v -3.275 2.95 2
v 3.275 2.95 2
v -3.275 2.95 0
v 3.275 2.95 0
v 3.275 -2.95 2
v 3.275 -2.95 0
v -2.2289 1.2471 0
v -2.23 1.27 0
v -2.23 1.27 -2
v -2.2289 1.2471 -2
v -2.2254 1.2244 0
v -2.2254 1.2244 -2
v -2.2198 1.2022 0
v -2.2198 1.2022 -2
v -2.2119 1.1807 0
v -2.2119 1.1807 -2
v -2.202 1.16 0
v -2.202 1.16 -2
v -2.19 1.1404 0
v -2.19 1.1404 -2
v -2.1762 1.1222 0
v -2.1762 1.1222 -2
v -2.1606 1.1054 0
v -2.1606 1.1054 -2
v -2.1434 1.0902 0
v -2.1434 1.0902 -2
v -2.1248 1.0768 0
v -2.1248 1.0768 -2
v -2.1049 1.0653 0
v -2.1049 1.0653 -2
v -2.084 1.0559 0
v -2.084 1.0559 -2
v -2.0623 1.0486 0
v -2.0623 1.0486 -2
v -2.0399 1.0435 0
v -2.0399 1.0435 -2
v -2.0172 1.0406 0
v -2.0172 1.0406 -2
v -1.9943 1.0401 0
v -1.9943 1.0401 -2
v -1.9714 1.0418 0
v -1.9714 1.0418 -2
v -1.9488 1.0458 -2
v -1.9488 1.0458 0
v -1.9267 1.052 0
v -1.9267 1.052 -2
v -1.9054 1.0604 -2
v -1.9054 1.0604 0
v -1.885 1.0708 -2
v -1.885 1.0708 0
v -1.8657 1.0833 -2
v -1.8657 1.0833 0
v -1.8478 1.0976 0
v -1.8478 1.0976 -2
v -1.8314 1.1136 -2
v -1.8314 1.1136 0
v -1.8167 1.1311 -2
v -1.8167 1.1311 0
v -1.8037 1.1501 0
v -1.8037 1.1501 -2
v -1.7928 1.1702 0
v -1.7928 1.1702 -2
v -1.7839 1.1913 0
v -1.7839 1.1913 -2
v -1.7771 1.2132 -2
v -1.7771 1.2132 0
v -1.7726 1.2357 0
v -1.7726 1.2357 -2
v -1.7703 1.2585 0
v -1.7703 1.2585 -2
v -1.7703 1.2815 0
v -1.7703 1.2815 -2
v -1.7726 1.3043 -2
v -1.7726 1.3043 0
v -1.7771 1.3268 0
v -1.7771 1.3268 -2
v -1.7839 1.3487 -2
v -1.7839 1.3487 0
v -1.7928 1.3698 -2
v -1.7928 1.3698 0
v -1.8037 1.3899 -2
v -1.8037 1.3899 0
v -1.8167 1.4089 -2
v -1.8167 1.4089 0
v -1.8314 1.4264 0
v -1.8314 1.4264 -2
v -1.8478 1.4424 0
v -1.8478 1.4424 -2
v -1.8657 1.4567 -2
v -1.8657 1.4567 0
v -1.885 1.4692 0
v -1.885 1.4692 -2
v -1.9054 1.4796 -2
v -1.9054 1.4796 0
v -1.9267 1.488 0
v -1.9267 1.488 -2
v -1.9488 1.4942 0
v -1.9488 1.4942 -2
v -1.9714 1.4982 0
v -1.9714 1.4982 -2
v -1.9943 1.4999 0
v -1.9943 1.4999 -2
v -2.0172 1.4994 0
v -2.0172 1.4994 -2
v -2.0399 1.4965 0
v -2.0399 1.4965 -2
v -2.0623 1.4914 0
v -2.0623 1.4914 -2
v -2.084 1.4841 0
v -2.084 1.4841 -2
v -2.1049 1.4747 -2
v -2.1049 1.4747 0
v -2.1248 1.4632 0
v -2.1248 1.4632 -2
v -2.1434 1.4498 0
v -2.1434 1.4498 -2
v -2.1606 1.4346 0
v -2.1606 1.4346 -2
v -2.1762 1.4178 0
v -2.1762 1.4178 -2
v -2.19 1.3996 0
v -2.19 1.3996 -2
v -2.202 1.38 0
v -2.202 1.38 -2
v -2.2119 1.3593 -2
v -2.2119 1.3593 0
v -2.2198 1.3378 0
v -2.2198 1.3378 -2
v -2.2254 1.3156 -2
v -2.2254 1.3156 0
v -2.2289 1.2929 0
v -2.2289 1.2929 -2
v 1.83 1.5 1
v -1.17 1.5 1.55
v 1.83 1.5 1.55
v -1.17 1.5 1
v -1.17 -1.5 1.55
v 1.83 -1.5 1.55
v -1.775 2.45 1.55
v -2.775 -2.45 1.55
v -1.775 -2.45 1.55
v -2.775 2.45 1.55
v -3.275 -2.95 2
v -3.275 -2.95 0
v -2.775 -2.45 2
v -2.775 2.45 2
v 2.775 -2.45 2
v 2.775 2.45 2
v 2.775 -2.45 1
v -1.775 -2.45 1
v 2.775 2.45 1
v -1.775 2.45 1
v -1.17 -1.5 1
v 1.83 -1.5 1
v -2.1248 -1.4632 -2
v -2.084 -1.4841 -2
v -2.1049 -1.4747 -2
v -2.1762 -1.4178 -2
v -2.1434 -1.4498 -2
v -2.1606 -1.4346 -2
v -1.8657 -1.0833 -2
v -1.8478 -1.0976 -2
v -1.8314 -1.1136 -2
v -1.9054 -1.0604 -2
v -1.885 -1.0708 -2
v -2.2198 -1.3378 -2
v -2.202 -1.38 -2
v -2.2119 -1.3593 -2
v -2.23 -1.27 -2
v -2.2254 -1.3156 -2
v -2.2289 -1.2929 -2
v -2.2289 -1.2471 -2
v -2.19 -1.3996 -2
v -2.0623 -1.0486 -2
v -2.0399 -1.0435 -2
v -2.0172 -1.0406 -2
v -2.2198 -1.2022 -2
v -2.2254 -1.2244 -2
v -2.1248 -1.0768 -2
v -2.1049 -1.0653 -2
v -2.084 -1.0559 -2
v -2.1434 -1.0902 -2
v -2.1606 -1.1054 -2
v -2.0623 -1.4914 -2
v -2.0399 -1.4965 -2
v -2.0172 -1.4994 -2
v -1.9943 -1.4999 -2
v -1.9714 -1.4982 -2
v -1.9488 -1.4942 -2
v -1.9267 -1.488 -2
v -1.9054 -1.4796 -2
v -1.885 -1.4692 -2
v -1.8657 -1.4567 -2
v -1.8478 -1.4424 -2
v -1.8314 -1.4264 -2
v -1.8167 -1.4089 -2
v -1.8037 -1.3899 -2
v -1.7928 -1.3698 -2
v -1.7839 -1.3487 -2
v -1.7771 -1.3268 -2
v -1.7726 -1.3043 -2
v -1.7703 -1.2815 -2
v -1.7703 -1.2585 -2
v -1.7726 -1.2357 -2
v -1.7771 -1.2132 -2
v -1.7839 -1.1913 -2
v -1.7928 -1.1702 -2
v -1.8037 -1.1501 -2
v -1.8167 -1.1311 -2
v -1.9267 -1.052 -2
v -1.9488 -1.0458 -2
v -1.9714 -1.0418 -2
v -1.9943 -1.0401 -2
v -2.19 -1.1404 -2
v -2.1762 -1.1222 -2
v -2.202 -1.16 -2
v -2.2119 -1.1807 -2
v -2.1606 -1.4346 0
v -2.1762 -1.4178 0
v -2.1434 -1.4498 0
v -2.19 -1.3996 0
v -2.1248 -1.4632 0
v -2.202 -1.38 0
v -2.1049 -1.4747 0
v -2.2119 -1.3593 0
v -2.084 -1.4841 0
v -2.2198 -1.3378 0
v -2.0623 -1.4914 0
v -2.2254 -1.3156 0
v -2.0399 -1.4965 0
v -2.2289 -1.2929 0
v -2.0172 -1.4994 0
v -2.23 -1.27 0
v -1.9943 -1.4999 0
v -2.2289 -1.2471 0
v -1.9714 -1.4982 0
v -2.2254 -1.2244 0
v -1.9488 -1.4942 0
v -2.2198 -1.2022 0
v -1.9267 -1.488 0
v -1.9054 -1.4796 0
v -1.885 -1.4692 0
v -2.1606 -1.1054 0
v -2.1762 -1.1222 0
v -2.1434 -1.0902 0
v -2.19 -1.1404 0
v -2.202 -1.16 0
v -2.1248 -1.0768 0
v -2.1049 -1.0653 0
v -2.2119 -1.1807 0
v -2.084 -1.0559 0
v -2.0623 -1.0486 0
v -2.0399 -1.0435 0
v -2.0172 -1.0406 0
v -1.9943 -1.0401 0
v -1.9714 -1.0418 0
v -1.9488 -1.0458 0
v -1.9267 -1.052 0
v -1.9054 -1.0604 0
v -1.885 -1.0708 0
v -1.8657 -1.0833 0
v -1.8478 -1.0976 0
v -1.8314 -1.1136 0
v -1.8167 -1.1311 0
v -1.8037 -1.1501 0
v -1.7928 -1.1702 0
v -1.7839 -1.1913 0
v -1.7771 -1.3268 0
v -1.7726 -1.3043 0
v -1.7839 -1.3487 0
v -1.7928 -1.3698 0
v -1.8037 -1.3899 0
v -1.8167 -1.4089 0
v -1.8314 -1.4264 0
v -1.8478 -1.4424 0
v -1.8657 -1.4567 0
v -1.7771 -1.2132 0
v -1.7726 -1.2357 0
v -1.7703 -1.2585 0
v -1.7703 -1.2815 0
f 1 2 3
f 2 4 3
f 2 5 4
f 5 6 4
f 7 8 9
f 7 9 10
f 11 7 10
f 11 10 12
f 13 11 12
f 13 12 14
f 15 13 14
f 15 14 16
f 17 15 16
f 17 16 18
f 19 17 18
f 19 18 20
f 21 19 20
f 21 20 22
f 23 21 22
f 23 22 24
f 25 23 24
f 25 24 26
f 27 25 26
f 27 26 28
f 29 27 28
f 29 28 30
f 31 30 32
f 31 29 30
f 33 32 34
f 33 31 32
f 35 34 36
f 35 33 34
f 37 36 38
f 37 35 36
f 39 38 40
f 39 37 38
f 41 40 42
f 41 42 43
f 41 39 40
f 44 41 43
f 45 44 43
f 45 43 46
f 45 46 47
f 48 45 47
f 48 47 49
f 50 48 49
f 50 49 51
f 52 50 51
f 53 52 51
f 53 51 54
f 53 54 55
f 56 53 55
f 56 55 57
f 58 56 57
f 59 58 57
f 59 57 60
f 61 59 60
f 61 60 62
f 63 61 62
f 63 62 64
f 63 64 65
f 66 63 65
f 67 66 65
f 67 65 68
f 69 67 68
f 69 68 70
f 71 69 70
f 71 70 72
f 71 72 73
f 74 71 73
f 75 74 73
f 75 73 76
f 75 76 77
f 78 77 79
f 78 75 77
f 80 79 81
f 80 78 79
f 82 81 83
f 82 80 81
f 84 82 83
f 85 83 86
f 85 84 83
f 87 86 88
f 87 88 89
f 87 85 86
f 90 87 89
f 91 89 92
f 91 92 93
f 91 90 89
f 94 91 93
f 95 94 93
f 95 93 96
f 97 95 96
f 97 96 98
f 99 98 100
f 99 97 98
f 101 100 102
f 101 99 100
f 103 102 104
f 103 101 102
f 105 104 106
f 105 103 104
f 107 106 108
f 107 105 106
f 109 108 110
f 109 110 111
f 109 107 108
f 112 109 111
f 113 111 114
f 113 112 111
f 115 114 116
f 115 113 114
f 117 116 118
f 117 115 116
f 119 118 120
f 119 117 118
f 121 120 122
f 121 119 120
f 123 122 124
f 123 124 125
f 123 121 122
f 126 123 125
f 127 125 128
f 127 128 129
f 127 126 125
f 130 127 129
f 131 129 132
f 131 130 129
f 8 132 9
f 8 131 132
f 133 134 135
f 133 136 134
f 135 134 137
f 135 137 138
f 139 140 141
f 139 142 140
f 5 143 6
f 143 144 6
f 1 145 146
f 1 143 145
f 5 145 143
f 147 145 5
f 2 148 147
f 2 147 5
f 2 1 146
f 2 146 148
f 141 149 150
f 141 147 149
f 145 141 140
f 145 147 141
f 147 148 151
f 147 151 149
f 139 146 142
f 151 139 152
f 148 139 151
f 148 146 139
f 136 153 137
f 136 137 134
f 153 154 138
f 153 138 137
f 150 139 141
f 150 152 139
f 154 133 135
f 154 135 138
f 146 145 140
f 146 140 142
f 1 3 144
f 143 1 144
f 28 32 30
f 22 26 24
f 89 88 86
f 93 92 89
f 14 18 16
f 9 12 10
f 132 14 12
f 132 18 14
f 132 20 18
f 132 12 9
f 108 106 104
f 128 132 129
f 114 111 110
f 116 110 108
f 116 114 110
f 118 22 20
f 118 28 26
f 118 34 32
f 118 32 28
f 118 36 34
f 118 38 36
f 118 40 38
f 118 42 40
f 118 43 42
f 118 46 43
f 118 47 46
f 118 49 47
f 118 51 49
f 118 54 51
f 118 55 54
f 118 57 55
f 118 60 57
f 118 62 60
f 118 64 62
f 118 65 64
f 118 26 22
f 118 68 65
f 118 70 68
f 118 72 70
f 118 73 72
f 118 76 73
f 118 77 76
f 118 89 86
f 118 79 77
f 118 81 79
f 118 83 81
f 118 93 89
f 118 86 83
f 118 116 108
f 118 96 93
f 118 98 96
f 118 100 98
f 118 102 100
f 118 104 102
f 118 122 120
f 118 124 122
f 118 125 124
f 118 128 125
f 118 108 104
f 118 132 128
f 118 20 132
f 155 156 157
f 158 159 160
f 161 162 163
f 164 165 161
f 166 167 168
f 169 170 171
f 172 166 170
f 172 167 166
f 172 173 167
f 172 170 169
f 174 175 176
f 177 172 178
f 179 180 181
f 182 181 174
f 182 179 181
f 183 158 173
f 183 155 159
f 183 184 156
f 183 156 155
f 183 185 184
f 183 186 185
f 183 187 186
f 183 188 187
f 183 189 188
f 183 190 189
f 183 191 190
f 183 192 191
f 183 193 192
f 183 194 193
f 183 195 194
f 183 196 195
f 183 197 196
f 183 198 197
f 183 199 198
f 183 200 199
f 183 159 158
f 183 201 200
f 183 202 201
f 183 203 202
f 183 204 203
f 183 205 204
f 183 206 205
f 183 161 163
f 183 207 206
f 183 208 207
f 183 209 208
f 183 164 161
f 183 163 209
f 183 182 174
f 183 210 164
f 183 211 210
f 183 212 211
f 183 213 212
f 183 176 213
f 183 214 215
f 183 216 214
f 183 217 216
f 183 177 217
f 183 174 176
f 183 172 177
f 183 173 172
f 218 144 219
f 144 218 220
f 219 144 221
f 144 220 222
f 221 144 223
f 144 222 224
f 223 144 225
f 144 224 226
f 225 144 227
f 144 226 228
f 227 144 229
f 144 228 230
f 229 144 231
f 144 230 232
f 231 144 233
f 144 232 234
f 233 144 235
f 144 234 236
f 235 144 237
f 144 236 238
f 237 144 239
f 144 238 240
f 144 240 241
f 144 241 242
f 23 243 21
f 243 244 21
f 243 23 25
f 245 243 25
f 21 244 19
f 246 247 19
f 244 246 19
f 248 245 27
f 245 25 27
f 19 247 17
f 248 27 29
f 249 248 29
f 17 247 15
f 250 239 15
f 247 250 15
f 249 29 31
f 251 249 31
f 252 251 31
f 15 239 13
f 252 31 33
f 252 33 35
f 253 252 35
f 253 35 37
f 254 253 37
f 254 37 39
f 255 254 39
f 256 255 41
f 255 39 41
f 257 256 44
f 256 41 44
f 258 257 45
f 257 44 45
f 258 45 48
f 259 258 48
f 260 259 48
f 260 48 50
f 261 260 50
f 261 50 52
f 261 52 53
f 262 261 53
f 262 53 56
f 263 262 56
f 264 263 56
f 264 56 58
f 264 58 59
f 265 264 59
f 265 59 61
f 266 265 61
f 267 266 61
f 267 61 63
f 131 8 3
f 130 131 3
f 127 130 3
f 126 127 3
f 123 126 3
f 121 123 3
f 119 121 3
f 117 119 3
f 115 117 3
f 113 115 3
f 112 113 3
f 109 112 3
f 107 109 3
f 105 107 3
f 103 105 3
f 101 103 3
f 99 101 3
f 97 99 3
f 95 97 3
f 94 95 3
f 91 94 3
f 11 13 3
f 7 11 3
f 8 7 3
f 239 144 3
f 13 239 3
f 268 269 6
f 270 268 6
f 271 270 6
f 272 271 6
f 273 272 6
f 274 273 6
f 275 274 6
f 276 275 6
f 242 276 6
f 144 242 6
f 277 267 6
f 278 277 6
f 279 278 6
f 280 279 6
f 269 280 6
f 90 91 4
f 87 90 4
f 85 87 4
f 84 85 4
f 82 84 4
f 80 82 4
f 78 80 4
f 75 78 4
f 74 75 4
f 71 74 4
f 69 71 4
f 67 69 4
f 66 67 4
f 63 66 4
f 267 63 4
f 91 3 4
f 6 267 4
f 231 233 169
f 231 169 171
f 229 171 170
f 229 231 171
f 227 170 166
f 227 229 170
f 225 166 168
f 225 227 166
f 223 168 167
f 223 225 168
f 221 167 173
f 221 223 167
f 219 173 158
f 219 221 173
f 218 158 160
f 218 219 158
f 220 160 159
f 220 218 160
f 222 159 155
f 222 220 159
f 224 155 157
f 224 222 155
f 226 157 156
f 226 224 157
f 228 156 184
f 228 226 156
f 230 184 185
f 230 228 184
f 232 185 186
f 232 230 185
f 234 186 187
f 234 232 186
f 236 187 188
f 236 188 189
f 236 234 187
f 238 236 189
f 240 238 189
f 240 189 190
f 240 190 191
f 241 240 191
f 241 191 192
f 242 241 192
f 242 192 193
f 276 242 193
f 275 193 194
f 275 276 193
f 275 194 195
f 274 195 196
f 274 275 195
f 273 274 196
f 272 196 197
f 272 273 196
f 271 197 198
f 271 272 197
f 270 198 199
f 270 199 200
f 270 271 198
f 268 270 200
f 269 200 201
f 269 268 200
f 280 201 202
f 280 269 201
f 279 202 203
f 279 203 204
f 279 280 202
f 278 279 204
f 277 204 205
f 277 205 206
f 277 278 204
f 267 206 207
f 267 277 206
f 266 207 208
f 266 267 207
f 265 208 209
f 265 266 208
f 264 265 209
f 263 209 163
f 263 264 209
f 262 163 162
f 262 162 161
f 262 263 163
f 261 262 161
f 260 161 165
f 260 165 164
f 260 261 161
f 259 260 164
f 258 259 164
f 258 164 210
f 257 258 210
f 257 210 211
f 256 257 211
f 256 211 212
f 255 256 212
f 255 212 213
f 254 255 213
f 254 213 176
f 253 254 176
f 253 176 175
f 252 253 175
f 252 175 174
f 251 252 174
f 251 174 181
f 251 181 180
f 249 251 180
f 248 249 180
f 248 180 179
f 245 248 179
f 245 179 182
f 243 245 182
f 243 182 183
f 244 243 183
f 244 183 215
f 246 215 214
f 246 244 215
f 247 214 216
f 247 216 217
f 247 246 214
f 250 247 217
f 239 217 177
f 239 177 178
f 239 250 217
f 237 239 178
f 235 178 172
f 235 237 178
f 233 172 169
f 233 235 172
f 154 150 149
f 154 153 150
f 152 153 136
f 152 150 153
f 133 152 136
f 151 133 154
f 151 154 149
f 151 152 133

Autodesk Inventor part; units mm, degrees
ref_plane "YZ Plane" through (0, 0, 0) normal (1, 0, 0) x (0, 1, 0)
ref_plane "XZ Plane" through (0, 0, 0) normal (0, 1, 0) x (-1, 0, 0)
ref_plane "XY Plane" through (0, 0, 0) normal (0, 0, 1) x (1, 0, 0)
sketch "Sketch1" plane through (0, 0, 0) normal (0, 0, 1) x (1, 0, 0)
  line L0 (-3.275, -2.95) -> (3.275, -2.95)
  line L1 (3.275, -2.95) -> (3.275, 2.95)
  line L2 (3.275, 2.95) -> (-3.275, 2.95)
  line L3 (-3.275, 2.95) -> (-3.275, -2.95)
  line L4 (-3.275, -2.95) -> (3.275, 2.95) construction
  line L5 (3.275, -2.95) -> (-3.275, 2.95) construction
  point P0 (0, 0)
  dimension "d0" = 6.55
  dimension "d1" = 5.9
extrude "Extrusion1" add sketch "Sketch1" along normal blind 2
sketch "Sketch2" plane through (0, 0, 2) normal (0, 0, 1) x (1, 0, 0)
  line L0 (-3.275, -2.95) -> (3.275, -2.95) projected
  line L1 (3.275, -2.95) -> (3.275, 2.95) projected
  line L2 (3.275, 2.95) -> (-3.275, 2.95) projected
  line L3 (-3.275, 2.95) -> (-3.275, -2.95) projected
  line L4 (-2.775, 2.45) -> (2.775, 2.45)
  line L5 (2.775, 2.45) -> (2.775, -2.45)
  line L6 (2.775, -2.45) -> (-2.775, -2.45)
  line L7 (-2.775, -2.45) -> (-2.775, 2.45)
  point P0 (0, 0)
  dimension "d4" = 0.5
extrude "Extrusion2" cut sketch "Sketch2" against normal blind 1 contours L4 L5 L6 L7
sketch "Sketch3" plane through (0, 0, 1) normal (0, 0, 1) x (1, 0, 0)
  line L0 (-2.775, 2.45) -> (2.775, 2.45) projected
  line L1 (-2.775, -2.45) -> (-2.775, 2.45) projected
  line L2 (2.775, -2.45) -> (-2.775, -2.45) projected
  line L3 (2.775, 2.45) -> (2.775, -2.45) projected
  line L4 (-1.17, 1.5) -> (1.83, 1.5)
  line L5 (1.83, 1.5) -> (1.83, -1.5)
  line L6 (1.83, -1.5) -> (-1.17, -1.5)
  line L7 (-1.17, -1.5) -> (-1.17, 1.5)
  line L8 (-1.17, 1.5) -> (1.83, -1.5) construction
  line L9 (1.83, 1.5) -> (-1.17, -1.5) construction
  line L10 (-2.775, 2.45) -> (-1.775, 2.45)
  line L11 (-1.775, 2.45) -> (-1.775, -2.45)
  line L12 (-1.775, -2.45) -> (-2.775, -2.45)
  line L13 (-2.775, -2.45) -> (-2.775, 2.45)
  point P0 (0, 0)
  point P1 (0.33, 0)
  dimension "d7" = 3
  dimension "d8" = 3
  dimension "d9" = 0.33
  dimension "d10" = 0
  dimension "d11" = 1
  dimension "d13" = 0
  dimension "d14" = 0
  dimension "d15" = 0
extrude "Extrusion3" add sketch "Sketch3" along normal blind 0.55 contours L0 L11 L2 L1 | L4 L5 L6 L7
sketch "Sketch4" plane through (0, 0, 0) normal (0, 0, -1) x (-1, 0, 0)
  line L0 (3.275, -2.95) -> (-3.275, -2.95) projected
  line L1 (3.275, 2.95) -> (3.275, -2.95) projected
  line L2 (-3.275, 2.95) -> (3.275, 2.95) projected
  line L3 (-3.275, -2.95) -> (-3.275, 2.95) projected
  circle A0 centre (2, 1.27) radius 0.23
  circle A1 centre (2, -1.27) radius 0.23
  line L4 (1.775, 2.45) -> (1.775, -2.45) projected
  line L5 (2, 1.27) -> (2, -1.27)
  line L6 (0, 0) -> (3.275, 0)
  point P0 (2, 0)
  dimension "d18" = 2
  dimension "d19" = 2
  dimension "d20" = 2.54
  dimension "d21" = 0.46
  dimension "d22" = 0.46
extrude "Extrusion4" add sketch "Sketch4" along normal blind 2 contours A0 L4 | A1 L4 | A0 L4 | L4 A1
equation "\"d0\" = MPPCHeight"
equation "\"d1\" = MPPCWidth"
equation "\"d19\" = d18"
equation "\"d22\" = d21"
equation "\"MPPCWidth\" = 5.9"
equation "\"MPPCHeight\" = 6.55"
properties part number "MPPC" material "ABS Plastic"
